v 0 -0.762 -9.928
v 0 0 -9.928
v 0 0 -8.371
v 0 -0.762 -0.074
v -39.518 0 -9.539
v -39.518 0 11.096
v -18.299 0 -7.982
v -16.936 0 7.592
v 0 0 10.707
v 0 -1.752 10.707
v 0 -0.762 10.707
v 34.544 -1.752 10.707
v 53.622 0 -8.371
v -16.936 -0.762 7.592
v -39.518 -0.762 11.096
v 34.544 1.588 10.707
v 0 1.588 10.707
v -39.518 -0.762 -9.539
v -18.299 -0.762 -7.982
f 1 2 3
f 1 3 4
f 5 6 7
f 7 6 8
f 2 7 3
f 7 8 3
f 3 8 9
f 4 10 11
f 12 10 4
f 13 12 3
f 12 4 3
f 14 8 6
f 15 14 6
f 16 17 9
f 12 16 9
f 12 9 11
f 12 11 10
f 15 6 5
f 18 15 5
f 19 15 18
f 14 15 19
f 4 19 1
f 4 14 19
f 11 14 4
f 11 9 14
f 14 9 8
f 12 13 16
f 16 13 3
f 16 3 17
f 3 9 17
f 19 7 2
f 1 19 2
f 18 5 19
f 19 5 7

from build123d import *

# Parameters (mm, degrees)
F1_DEPTH    = 59.944
F2_T1_DEPTH = 133.9811516914
F4_DEPTH    = 0.762


# Not quite as in the source:
# - a fillet or chamfer that OpenCascade refuses, or shapes differently, is made with other operations: its cross-section is extruded or revolved along the edge and cut away or added


with BuildPart() as f1:
    # F0 (on Right) → F1 (new body)
    with BuildSketch(Plane.YZ):
        Polygon((1.5876128762, 10.7069341466), (0, 10.7069341466), (-1.7520430265, 10.7069341466), (0, -8.3708763123), align=None)
    extrude(amount=F1_DEPTH)

    # F2: chamfer of 25.4 on 1 edges, made by hand

    # F2_s2 → F2_t1 (cut)
    with BuildSketch(Plane.XZ.offset(-66.9083607706)):
        Polygon((59.944, -14.6930658534), (34.544, 10.7069341466), (59.944, 10.7069341466), align=None)
    extrude(amount=F2_T1_DEPTH, mode=Mode.SUBTRACT)

    # F3 (on Front) → F4 (join)
    with BuildSketch(Plane.XZ):
        Polygon((0, -9.9282488227), (0, 10.7069341466), (-16.936423257, 7.592190057), (-39.5183227956, 11.0962782055), (-39.5183227956, -9.5389056951), (-18.2991251349, -7.9815322533), align=None)
    extrude(amount=F4_DEPTH)


solid = f1.part
